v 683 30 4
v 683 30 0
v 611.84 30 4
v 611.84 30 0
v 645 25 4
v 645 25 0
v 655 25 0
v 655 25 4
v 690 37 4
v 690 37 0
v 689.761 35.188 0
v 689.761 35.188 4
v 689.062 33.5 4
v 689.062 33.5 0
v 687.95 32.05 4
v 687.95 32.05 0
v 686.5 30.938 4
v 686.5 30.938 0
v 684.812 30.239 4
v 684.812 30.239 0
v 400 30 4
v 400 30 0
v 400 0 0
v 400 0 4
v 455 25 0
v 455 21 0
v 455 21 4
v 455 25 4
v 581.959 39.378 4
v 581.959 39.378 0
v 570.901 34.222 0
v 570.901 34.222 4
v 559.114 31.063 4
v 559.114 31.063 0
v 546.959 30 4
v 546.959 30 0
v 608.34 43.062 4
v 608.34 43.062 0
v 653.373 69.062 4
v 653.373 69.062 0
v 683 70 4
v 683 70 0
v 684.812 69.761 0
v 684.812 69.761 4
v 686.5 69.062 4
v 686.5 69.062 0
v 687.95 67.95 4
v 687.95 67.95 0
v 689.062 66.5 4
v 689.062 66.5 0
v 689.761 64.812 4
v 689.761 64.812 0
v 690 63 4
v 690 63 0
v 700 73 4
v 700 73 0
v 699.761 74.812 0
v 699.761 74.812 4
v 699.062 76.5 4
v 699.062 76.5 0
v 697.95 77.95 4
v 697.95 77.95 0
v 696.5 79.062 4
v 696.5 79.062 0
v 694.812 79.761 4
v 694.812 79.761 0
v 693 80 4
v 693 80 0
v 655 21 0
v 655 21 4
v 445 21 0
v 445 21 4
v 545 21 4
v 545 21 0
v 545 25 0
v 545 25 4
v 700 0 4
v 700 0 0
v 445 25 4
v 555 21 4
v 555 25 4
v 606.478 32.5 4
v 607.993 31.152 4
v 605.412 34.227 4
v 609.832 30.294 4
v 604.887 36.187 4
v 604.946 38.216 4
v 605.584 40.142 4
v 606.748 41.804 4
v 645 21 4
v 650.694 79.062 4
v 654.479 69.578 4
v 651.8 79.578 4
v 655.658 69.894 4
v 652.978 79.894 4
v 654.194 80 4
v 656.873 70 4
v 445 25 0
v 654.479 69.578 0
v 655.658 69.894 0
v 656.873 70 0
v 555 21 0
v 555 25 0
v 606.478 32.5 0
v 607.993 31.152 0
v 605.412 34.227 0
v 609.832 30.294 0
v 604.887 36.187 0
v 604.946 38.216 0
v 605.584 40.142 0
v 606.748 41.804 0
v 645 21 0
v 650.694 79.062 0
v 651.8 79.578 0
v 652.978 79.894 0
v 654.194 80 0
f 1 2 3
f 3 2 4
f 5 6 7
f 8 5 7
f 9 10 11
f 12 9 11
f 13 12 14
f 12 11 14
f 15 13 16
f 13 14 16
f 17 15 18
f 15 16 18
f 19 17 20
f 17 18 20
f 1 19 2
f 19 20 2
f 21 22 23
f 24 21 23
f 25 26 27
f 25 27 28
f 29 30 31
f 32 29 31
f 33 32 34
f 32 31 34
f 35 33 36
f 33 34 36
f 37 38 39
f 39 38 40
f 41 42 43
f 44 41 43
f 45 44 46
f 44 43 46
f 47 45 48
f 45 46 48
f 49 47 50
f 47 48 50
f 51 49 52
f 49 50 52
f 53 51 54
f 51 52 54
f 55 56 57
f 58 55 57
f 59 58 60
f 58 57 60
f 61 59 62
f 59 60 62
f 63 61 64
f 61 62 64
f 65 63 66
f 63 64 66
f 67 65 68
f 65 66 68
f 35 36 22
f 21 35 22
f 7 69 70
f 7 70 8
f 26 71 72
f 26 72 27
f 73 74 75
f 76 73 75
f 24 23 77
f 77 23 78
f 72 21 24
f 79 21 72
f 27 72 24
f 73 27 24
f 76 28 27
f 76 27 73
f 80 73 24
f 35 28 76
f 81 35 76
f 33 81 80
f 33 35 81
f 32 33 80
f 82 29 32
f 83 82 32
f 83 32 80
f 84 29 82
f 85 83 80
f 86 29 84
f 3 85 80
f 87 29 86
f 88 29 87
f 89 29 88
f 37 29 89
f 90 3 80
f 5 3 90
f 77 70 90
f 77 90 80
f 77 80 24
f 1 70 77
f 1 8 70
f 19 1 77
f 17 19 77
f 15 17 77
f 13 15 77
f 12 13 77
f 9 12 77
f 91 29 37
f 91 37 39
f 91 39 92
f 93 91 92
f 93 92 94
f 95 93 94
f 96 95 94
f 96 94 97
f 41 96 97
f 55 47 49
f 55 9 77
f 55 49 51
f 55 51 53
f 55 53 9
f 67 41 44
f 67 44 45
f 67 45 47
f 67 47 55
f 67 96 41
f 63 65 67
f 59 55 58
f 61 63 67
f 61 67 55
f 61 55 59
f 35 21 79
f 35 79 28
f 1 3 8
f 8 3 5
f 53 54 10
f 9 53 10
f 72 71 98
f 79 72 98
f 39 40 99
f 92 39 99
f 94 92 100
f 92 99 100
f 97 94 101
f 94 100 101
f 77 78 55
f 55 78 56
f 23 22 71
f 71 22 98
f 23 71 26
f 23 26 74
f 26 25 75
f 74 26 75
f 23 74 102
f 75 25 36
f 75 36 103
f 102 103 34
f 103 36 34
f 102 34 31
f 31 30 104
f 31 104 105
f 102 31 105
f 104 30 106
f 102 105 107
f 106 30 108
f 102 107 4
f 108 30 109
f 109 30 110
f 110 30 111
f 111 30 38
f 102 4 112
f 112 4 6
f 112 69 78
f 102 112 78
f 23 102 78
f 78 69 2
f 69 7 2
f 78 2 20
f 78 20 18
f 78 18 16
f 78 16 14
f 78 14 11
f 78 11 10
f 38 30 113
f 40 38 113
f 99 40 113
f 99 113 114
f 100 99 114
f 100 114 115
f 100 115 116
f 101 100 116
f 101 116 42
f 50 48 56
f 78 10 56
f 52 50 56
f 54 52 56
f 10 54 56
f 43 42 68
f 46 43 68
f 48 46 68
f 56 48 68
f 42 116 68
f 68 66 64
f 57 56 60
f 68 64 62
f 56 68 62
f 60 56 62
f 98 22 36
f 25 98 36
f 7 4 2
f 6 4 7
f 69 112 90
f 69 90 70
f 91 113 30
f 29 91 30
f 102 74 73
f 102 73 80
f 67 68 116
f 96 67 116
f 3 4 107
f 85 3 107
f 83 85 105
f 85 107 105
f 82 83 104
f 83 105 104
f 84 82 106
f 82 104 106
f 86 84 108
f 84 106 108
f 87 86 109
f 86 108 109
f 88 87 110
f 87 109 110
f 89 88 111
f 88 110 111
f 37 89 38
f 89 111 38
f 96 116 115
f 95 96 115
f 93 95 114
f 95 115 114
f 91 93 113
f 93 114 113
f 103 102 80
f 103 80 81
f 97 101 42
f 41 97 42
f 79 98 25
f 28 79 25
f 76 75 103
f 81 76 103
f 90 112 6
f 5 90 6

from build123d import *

# Parameters (mm, degrees)
SCHIZZO1_W                   = 10
SCHIZZO1_H                   = 4
ESTRUSIONE_ESTRUSIONE3_DEPTH = 4


with BuildPart() as part:
    # Schizzo1 → Estrusione-Estrusione3 (new body)
    with BuildSketch(Plane.XY):
        with BuildLine():
            Line((400, 30), (400, 0))
            Line((400, 0), (700, 0))
            Line((700, 0), (700, 30))
            Line((700, 30), (700, 73))
            ThreePointArc((700, 73), (697.949747468, 77.949747468), (693, 80))
            Line((693, 80), (654.193736081, 80))
            ThreePointArc((654.193736081, 80), (652.382002765, 79.761480784), (650.693736081, 79.062177826))
            Line((650.693736081, 79.062177826), (581.959107885, 39.378221735))
            ThreePointArc((581.959107885, 39.378221735), (565.076441043, 32.38519216), (546.959107885, 30))
            Line((546.959107885, 30), (400, 30))
        make_face()
        with Locations((450, 23)):
            Rectangle(SCHIZZO1_W, SCHIZZO1_H, mode=Mode.SUBTRACT)
        with Locations((550, 23)):
            Rectangle(SCHIZZO1_W, SCHIZZO1_H, mode=Mode.SUBTRACT)
        with Locations((650, 23)):
            Rectangle(SCHIZZO1_W, SCHIZZO1_H, mode=Mode.SUBTRACT)
        with BuildLine():
            Line((690, 63), (690, 37))
            ThreePointArc((690, 37), (687.949747468, 32.050252532), (683, 30))
            Line((683, 30), (611.839907009, 30))
            ThreePointArc((611.839907009, 30), (605.078426225, 35.188266684), (608.339907009, 43.062177826))
            Line((608.339907009, 43.062177826), (653.373228005, 69.062177826))
            ThreePointArc((653.373228005, 69.062177826), (655.06149469, 69.761480784), (656.873228005, 70))
            Line((656.873228005, 70), (683, 70))
            ThreePointArc((683, 70), (687.949747468, 67.949747468), (690, 63))
        make_face(mode=Mode.SUBTRACT)
    extrude(amount=ESTRUSIONE_ESTRUSIONE3_DEPTH)


solid = part.part
